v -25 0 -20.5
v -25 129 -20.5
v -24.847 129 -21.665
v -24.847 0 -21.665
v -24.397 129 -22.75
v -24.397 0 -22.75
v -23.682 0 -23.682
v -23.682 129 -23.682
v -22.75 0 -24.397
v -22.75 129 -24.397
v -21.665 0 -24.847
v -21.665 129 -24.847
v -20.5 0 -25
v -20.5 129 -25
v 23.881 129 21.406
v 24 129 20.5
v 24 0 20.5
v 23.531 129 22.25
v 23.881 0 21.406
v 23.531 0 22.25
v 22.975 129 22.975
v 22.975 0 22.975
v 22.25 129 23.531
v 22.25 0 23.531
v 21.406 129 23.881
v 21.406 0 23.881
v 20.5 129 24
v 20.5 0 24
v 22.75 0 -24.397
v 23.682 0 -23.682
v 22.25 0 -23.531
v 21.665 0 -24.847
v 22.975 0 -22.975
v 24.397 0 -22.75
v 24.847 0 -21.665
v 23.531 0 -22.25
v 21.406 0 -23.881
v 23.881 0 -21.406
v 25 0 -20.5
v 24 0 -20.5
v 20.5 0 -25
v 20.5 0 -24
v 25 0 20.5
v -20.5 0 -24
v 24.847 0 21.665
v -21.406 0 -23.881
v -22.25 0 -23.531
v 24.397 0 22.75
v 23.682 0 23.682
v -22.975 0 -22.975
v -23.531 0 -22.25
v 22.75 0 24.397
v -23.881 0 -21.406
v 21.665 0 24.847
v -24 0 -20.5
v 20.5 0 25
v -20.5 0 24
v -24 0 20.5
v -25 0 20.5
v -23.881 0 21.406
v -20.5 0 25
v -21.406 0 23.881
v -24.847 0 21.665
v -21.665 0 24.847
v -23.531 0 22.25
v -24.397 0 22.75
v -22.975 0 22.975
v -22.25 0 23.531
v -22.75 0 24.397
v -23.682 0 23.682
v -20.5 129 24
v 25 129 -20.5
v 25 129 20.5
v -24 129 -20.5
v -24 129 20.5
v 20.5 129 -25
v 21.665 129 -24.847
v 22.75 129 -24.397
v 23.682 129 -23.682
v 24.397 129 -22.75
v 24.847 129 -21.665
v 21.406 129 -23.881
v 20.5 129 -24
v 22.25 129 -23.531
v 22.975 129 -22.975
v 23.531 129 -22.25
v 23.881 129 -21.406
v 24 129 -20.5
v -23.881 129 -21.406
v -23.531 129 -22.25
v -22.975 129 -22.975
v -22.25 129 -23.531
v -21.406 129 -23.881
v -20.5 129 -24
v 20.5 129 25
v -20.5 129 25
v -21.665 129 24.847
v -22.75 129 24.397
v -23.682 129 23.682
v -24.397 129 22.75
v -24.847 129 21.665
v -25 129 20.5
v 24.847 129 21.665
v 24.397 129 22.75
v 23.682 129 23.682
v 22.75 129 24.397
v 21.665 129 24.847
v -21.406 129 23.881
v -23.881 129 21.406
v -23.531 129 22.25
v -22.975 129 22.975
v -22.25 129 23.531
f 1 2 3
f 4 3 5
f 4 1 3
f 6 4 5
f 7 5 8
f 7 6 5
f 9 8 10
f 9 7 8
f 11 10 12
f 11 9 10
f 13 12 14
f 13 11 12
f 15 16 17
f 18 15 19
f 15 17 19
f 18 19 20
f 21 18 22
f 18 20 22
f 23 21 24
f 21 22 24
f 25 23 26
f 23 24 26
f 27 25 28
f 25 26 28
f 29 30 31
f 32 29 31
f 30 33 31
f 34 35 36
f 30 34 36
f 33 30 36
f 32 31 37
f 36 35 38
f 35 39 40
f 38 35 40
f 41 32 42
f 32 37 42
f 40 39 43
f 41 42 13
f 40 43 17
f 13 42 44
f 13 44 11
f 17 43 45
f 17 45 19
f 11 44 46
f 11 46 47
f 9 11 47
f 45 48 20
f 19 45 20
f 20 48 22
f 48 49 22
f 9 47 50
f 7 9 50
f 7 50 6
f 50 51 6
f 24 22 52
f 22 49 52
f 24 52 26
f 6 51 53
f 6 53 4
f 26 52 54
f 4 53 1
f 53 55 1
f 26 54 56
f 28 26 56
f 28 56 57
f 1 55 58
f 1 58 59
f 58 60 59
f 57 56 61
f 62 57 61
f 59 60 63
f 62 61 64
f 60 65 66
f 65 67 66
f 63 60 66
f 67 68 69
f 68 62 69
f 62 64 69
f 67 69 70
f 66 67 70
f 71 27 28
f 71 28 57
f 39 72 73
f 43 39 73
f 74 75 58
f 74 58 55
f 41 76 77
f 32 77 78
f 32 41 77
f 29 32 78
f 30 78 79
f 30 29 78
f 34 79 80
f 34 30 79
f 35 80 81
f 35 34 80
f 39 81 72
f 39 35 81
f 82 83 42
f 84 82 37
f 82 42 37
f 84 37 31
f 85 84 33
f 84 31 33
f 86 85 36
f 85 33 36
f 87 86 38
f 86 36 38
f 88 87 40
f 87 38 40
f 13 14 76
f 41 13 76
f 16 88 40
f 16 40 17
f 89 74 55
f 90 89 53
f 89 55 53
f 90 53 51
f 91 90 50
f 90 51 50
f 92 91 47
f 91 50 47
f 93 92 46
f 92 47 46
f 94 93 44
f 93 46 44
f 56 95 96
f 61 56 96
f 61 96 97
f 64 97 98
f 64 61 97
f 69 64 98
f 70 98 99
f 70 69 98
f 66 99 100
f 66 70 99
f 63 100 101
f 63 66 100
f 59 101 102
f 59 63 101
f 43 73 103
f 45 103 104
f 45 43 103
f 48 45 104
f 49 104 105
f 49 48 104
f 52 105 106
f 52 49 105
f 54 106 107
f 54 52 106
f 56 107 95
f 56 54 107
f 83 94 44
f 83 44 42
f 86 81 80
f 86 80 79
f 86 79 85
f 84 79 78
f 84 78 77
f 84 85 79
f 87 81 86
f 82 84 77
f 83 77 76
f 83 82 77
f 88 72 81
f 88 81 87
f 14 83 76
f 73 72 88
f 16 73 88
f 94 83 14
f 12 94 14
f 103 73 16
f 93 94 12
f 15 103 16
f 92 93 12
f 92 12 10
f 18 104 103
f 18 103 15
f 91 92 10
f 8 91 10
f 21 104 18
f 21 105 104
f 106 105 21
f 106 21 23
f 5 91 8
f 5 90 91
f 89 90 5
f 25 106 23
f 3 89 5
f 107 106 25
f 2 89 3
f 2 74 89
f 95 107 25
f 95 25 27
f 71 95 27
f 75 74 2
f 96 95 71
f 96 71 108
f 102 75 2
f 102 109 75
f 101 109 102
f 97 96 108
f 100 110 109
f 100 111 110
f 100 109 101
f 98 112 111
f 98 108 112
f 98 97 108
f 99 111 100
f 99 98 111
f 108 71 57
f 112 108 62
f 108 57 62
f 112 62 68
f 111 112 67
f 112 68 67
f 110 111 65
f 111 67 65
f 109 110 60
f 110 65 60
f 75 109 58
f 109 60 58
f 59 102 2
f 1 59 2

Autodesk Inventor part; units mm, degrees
ref_plane "YZ Plane" through (0, 0, 0) normal (1, 0, 0) x (0, 1, 0)
ref_plane "XZ Plane" through (0, 0, 0) normal (0, 1, 0) x (-1, 0, 0)
sketch "Эскиз1" plane through (0, 0, 0) normal (0, 1, 0) x (-1, 0, 0)
  line L0 (-25, -20.5) -> (-25, 20.5)
  line L1 (-20.5, 25) -> (20.5, 25)
  line L2 (25, 20.5) -> (25, -20.5)
  line L3 (20.5, -25) -> (-20.5, -25)
  arc A0 (-25, -20.5) -> (-20.5, -25) centre (-20.5, -20.5) ccw
  arc A1 (-20.5, 25) -> (-25, 20.5) centre (-20.5, 20.5) ccw
  arc A2 (25, 20.5) -> (20.5, 25) centre (20.5, 20.5) ccw
  arc A3 (20.5, -25) -> (25, -20.5) centre (20.5, -20.5) ccw
  arc A4 (-20.5, 22) -> (-22, 20.5) centre (-20.5, 20.5) ccw
  line L4 (-20.5, 22) -> (20.5, 22)
  arc A5 (22, 20.5) -> (20.5, 22) centre (20.5, 20.5) ccw
  line L5 (22, 20.5) -> (22, -20.5)
  arc A6 (20.5, -22) -> (22, -20.5) centre (20.5, -20.5) ccw
  line L6 (20.5, -22) -> (-20.5, -22)
  arc A7 (-22, -20.5) -> (-20.5, -22) centre (-20.5, -20.5) ccw
  line L7 (-22, -20.5) -> (-22, 20.5)
  line L8 (0, 36.3048) -> (0, -36.3048) construction
  line L9 (-36.3048, 0) -> (36.3048, 0) construction
  arc A8 (20.5, -26) -> (26, -20.5) centre (20.5, -20.5) ccw
  line L10 (20.5, -26) -> (-20.5, -26)
  arc A9 (-26, -20.5) -> (-20.5, -26) centre (-20.5, -20.5) ccw
  line L11 (-26, -20.5) -> (-26, 20.5)
  arc A10 (-20.5, 26) -> (-26, 20.5) centre (-20.5, 20.5) ccw
  line L12 (-20.5, 26) -> (20.5, 26)
  arc A11 (26, 20.5) -> (20.5, 26) centre (20.5, 20.5) ccw
  line L13 (26, 20.5) -> (26, -20.5)
  arc A12 (20.5, -24) -> (24, -20.5) centre (20.5, -20.5) ccw
  line L14 (20.5, -24) -> (-20.5, -24)
  arc A13 (-24, -20.5) -> (-20.5, -24) centre (-20.5, -20.5) ccw
  line L15 (-24, -20.5) -> (-24, 20.5)
  arc A14 (-20.5, 24) -> (-24, 20.5) centre (-20.5, 20.5) ccw
  line L16 (-20.5, 24) -> (20.5, 24)
  arc A15 (24, 20.5) -> (20.5, 24) centre (20.5, 20.5) ccw
  line L17 (24, 20.5) -> (24, -20.5)
  point P0 (0, 0)
  dimension "d0" = 4.5
  dimension "d1" = 50
  dimension "d2" = 50
  dimension "d3" = 3
  dimension "d4" = 25
  dimension "d5" = 25
  dimension "d10" = 1
  dimension "d13" = 1
extrude "Выдавливание1" add sketch "Эскиз1" along normal blind 129 contours L0 A1 L1 A2 L2 A3 L3 A0
ref_plane "РабПлоскость1" through (0, 104, 0) normal (0, 1, 0) x (1, 0, 0)
split_face "Разделение1"
equation "\"d0\" = d6"
equation "\"d1\" = d7"
equation "\"d2\" = d8"
equation "\"d3\" = d9"
equation "\"d4\" = 0.5 * d1"
equation "\"d5\" = 0.5 * d2"
equation "\"d6\" = 1.5 * d9"
equation "\"d7\" = 50"
equation "\"d8\" = 50"
equation "\"d9\" = 3"
properties part number "Fiberglass_isolation" material "Стекловолоконная обертывающая изоляция"
